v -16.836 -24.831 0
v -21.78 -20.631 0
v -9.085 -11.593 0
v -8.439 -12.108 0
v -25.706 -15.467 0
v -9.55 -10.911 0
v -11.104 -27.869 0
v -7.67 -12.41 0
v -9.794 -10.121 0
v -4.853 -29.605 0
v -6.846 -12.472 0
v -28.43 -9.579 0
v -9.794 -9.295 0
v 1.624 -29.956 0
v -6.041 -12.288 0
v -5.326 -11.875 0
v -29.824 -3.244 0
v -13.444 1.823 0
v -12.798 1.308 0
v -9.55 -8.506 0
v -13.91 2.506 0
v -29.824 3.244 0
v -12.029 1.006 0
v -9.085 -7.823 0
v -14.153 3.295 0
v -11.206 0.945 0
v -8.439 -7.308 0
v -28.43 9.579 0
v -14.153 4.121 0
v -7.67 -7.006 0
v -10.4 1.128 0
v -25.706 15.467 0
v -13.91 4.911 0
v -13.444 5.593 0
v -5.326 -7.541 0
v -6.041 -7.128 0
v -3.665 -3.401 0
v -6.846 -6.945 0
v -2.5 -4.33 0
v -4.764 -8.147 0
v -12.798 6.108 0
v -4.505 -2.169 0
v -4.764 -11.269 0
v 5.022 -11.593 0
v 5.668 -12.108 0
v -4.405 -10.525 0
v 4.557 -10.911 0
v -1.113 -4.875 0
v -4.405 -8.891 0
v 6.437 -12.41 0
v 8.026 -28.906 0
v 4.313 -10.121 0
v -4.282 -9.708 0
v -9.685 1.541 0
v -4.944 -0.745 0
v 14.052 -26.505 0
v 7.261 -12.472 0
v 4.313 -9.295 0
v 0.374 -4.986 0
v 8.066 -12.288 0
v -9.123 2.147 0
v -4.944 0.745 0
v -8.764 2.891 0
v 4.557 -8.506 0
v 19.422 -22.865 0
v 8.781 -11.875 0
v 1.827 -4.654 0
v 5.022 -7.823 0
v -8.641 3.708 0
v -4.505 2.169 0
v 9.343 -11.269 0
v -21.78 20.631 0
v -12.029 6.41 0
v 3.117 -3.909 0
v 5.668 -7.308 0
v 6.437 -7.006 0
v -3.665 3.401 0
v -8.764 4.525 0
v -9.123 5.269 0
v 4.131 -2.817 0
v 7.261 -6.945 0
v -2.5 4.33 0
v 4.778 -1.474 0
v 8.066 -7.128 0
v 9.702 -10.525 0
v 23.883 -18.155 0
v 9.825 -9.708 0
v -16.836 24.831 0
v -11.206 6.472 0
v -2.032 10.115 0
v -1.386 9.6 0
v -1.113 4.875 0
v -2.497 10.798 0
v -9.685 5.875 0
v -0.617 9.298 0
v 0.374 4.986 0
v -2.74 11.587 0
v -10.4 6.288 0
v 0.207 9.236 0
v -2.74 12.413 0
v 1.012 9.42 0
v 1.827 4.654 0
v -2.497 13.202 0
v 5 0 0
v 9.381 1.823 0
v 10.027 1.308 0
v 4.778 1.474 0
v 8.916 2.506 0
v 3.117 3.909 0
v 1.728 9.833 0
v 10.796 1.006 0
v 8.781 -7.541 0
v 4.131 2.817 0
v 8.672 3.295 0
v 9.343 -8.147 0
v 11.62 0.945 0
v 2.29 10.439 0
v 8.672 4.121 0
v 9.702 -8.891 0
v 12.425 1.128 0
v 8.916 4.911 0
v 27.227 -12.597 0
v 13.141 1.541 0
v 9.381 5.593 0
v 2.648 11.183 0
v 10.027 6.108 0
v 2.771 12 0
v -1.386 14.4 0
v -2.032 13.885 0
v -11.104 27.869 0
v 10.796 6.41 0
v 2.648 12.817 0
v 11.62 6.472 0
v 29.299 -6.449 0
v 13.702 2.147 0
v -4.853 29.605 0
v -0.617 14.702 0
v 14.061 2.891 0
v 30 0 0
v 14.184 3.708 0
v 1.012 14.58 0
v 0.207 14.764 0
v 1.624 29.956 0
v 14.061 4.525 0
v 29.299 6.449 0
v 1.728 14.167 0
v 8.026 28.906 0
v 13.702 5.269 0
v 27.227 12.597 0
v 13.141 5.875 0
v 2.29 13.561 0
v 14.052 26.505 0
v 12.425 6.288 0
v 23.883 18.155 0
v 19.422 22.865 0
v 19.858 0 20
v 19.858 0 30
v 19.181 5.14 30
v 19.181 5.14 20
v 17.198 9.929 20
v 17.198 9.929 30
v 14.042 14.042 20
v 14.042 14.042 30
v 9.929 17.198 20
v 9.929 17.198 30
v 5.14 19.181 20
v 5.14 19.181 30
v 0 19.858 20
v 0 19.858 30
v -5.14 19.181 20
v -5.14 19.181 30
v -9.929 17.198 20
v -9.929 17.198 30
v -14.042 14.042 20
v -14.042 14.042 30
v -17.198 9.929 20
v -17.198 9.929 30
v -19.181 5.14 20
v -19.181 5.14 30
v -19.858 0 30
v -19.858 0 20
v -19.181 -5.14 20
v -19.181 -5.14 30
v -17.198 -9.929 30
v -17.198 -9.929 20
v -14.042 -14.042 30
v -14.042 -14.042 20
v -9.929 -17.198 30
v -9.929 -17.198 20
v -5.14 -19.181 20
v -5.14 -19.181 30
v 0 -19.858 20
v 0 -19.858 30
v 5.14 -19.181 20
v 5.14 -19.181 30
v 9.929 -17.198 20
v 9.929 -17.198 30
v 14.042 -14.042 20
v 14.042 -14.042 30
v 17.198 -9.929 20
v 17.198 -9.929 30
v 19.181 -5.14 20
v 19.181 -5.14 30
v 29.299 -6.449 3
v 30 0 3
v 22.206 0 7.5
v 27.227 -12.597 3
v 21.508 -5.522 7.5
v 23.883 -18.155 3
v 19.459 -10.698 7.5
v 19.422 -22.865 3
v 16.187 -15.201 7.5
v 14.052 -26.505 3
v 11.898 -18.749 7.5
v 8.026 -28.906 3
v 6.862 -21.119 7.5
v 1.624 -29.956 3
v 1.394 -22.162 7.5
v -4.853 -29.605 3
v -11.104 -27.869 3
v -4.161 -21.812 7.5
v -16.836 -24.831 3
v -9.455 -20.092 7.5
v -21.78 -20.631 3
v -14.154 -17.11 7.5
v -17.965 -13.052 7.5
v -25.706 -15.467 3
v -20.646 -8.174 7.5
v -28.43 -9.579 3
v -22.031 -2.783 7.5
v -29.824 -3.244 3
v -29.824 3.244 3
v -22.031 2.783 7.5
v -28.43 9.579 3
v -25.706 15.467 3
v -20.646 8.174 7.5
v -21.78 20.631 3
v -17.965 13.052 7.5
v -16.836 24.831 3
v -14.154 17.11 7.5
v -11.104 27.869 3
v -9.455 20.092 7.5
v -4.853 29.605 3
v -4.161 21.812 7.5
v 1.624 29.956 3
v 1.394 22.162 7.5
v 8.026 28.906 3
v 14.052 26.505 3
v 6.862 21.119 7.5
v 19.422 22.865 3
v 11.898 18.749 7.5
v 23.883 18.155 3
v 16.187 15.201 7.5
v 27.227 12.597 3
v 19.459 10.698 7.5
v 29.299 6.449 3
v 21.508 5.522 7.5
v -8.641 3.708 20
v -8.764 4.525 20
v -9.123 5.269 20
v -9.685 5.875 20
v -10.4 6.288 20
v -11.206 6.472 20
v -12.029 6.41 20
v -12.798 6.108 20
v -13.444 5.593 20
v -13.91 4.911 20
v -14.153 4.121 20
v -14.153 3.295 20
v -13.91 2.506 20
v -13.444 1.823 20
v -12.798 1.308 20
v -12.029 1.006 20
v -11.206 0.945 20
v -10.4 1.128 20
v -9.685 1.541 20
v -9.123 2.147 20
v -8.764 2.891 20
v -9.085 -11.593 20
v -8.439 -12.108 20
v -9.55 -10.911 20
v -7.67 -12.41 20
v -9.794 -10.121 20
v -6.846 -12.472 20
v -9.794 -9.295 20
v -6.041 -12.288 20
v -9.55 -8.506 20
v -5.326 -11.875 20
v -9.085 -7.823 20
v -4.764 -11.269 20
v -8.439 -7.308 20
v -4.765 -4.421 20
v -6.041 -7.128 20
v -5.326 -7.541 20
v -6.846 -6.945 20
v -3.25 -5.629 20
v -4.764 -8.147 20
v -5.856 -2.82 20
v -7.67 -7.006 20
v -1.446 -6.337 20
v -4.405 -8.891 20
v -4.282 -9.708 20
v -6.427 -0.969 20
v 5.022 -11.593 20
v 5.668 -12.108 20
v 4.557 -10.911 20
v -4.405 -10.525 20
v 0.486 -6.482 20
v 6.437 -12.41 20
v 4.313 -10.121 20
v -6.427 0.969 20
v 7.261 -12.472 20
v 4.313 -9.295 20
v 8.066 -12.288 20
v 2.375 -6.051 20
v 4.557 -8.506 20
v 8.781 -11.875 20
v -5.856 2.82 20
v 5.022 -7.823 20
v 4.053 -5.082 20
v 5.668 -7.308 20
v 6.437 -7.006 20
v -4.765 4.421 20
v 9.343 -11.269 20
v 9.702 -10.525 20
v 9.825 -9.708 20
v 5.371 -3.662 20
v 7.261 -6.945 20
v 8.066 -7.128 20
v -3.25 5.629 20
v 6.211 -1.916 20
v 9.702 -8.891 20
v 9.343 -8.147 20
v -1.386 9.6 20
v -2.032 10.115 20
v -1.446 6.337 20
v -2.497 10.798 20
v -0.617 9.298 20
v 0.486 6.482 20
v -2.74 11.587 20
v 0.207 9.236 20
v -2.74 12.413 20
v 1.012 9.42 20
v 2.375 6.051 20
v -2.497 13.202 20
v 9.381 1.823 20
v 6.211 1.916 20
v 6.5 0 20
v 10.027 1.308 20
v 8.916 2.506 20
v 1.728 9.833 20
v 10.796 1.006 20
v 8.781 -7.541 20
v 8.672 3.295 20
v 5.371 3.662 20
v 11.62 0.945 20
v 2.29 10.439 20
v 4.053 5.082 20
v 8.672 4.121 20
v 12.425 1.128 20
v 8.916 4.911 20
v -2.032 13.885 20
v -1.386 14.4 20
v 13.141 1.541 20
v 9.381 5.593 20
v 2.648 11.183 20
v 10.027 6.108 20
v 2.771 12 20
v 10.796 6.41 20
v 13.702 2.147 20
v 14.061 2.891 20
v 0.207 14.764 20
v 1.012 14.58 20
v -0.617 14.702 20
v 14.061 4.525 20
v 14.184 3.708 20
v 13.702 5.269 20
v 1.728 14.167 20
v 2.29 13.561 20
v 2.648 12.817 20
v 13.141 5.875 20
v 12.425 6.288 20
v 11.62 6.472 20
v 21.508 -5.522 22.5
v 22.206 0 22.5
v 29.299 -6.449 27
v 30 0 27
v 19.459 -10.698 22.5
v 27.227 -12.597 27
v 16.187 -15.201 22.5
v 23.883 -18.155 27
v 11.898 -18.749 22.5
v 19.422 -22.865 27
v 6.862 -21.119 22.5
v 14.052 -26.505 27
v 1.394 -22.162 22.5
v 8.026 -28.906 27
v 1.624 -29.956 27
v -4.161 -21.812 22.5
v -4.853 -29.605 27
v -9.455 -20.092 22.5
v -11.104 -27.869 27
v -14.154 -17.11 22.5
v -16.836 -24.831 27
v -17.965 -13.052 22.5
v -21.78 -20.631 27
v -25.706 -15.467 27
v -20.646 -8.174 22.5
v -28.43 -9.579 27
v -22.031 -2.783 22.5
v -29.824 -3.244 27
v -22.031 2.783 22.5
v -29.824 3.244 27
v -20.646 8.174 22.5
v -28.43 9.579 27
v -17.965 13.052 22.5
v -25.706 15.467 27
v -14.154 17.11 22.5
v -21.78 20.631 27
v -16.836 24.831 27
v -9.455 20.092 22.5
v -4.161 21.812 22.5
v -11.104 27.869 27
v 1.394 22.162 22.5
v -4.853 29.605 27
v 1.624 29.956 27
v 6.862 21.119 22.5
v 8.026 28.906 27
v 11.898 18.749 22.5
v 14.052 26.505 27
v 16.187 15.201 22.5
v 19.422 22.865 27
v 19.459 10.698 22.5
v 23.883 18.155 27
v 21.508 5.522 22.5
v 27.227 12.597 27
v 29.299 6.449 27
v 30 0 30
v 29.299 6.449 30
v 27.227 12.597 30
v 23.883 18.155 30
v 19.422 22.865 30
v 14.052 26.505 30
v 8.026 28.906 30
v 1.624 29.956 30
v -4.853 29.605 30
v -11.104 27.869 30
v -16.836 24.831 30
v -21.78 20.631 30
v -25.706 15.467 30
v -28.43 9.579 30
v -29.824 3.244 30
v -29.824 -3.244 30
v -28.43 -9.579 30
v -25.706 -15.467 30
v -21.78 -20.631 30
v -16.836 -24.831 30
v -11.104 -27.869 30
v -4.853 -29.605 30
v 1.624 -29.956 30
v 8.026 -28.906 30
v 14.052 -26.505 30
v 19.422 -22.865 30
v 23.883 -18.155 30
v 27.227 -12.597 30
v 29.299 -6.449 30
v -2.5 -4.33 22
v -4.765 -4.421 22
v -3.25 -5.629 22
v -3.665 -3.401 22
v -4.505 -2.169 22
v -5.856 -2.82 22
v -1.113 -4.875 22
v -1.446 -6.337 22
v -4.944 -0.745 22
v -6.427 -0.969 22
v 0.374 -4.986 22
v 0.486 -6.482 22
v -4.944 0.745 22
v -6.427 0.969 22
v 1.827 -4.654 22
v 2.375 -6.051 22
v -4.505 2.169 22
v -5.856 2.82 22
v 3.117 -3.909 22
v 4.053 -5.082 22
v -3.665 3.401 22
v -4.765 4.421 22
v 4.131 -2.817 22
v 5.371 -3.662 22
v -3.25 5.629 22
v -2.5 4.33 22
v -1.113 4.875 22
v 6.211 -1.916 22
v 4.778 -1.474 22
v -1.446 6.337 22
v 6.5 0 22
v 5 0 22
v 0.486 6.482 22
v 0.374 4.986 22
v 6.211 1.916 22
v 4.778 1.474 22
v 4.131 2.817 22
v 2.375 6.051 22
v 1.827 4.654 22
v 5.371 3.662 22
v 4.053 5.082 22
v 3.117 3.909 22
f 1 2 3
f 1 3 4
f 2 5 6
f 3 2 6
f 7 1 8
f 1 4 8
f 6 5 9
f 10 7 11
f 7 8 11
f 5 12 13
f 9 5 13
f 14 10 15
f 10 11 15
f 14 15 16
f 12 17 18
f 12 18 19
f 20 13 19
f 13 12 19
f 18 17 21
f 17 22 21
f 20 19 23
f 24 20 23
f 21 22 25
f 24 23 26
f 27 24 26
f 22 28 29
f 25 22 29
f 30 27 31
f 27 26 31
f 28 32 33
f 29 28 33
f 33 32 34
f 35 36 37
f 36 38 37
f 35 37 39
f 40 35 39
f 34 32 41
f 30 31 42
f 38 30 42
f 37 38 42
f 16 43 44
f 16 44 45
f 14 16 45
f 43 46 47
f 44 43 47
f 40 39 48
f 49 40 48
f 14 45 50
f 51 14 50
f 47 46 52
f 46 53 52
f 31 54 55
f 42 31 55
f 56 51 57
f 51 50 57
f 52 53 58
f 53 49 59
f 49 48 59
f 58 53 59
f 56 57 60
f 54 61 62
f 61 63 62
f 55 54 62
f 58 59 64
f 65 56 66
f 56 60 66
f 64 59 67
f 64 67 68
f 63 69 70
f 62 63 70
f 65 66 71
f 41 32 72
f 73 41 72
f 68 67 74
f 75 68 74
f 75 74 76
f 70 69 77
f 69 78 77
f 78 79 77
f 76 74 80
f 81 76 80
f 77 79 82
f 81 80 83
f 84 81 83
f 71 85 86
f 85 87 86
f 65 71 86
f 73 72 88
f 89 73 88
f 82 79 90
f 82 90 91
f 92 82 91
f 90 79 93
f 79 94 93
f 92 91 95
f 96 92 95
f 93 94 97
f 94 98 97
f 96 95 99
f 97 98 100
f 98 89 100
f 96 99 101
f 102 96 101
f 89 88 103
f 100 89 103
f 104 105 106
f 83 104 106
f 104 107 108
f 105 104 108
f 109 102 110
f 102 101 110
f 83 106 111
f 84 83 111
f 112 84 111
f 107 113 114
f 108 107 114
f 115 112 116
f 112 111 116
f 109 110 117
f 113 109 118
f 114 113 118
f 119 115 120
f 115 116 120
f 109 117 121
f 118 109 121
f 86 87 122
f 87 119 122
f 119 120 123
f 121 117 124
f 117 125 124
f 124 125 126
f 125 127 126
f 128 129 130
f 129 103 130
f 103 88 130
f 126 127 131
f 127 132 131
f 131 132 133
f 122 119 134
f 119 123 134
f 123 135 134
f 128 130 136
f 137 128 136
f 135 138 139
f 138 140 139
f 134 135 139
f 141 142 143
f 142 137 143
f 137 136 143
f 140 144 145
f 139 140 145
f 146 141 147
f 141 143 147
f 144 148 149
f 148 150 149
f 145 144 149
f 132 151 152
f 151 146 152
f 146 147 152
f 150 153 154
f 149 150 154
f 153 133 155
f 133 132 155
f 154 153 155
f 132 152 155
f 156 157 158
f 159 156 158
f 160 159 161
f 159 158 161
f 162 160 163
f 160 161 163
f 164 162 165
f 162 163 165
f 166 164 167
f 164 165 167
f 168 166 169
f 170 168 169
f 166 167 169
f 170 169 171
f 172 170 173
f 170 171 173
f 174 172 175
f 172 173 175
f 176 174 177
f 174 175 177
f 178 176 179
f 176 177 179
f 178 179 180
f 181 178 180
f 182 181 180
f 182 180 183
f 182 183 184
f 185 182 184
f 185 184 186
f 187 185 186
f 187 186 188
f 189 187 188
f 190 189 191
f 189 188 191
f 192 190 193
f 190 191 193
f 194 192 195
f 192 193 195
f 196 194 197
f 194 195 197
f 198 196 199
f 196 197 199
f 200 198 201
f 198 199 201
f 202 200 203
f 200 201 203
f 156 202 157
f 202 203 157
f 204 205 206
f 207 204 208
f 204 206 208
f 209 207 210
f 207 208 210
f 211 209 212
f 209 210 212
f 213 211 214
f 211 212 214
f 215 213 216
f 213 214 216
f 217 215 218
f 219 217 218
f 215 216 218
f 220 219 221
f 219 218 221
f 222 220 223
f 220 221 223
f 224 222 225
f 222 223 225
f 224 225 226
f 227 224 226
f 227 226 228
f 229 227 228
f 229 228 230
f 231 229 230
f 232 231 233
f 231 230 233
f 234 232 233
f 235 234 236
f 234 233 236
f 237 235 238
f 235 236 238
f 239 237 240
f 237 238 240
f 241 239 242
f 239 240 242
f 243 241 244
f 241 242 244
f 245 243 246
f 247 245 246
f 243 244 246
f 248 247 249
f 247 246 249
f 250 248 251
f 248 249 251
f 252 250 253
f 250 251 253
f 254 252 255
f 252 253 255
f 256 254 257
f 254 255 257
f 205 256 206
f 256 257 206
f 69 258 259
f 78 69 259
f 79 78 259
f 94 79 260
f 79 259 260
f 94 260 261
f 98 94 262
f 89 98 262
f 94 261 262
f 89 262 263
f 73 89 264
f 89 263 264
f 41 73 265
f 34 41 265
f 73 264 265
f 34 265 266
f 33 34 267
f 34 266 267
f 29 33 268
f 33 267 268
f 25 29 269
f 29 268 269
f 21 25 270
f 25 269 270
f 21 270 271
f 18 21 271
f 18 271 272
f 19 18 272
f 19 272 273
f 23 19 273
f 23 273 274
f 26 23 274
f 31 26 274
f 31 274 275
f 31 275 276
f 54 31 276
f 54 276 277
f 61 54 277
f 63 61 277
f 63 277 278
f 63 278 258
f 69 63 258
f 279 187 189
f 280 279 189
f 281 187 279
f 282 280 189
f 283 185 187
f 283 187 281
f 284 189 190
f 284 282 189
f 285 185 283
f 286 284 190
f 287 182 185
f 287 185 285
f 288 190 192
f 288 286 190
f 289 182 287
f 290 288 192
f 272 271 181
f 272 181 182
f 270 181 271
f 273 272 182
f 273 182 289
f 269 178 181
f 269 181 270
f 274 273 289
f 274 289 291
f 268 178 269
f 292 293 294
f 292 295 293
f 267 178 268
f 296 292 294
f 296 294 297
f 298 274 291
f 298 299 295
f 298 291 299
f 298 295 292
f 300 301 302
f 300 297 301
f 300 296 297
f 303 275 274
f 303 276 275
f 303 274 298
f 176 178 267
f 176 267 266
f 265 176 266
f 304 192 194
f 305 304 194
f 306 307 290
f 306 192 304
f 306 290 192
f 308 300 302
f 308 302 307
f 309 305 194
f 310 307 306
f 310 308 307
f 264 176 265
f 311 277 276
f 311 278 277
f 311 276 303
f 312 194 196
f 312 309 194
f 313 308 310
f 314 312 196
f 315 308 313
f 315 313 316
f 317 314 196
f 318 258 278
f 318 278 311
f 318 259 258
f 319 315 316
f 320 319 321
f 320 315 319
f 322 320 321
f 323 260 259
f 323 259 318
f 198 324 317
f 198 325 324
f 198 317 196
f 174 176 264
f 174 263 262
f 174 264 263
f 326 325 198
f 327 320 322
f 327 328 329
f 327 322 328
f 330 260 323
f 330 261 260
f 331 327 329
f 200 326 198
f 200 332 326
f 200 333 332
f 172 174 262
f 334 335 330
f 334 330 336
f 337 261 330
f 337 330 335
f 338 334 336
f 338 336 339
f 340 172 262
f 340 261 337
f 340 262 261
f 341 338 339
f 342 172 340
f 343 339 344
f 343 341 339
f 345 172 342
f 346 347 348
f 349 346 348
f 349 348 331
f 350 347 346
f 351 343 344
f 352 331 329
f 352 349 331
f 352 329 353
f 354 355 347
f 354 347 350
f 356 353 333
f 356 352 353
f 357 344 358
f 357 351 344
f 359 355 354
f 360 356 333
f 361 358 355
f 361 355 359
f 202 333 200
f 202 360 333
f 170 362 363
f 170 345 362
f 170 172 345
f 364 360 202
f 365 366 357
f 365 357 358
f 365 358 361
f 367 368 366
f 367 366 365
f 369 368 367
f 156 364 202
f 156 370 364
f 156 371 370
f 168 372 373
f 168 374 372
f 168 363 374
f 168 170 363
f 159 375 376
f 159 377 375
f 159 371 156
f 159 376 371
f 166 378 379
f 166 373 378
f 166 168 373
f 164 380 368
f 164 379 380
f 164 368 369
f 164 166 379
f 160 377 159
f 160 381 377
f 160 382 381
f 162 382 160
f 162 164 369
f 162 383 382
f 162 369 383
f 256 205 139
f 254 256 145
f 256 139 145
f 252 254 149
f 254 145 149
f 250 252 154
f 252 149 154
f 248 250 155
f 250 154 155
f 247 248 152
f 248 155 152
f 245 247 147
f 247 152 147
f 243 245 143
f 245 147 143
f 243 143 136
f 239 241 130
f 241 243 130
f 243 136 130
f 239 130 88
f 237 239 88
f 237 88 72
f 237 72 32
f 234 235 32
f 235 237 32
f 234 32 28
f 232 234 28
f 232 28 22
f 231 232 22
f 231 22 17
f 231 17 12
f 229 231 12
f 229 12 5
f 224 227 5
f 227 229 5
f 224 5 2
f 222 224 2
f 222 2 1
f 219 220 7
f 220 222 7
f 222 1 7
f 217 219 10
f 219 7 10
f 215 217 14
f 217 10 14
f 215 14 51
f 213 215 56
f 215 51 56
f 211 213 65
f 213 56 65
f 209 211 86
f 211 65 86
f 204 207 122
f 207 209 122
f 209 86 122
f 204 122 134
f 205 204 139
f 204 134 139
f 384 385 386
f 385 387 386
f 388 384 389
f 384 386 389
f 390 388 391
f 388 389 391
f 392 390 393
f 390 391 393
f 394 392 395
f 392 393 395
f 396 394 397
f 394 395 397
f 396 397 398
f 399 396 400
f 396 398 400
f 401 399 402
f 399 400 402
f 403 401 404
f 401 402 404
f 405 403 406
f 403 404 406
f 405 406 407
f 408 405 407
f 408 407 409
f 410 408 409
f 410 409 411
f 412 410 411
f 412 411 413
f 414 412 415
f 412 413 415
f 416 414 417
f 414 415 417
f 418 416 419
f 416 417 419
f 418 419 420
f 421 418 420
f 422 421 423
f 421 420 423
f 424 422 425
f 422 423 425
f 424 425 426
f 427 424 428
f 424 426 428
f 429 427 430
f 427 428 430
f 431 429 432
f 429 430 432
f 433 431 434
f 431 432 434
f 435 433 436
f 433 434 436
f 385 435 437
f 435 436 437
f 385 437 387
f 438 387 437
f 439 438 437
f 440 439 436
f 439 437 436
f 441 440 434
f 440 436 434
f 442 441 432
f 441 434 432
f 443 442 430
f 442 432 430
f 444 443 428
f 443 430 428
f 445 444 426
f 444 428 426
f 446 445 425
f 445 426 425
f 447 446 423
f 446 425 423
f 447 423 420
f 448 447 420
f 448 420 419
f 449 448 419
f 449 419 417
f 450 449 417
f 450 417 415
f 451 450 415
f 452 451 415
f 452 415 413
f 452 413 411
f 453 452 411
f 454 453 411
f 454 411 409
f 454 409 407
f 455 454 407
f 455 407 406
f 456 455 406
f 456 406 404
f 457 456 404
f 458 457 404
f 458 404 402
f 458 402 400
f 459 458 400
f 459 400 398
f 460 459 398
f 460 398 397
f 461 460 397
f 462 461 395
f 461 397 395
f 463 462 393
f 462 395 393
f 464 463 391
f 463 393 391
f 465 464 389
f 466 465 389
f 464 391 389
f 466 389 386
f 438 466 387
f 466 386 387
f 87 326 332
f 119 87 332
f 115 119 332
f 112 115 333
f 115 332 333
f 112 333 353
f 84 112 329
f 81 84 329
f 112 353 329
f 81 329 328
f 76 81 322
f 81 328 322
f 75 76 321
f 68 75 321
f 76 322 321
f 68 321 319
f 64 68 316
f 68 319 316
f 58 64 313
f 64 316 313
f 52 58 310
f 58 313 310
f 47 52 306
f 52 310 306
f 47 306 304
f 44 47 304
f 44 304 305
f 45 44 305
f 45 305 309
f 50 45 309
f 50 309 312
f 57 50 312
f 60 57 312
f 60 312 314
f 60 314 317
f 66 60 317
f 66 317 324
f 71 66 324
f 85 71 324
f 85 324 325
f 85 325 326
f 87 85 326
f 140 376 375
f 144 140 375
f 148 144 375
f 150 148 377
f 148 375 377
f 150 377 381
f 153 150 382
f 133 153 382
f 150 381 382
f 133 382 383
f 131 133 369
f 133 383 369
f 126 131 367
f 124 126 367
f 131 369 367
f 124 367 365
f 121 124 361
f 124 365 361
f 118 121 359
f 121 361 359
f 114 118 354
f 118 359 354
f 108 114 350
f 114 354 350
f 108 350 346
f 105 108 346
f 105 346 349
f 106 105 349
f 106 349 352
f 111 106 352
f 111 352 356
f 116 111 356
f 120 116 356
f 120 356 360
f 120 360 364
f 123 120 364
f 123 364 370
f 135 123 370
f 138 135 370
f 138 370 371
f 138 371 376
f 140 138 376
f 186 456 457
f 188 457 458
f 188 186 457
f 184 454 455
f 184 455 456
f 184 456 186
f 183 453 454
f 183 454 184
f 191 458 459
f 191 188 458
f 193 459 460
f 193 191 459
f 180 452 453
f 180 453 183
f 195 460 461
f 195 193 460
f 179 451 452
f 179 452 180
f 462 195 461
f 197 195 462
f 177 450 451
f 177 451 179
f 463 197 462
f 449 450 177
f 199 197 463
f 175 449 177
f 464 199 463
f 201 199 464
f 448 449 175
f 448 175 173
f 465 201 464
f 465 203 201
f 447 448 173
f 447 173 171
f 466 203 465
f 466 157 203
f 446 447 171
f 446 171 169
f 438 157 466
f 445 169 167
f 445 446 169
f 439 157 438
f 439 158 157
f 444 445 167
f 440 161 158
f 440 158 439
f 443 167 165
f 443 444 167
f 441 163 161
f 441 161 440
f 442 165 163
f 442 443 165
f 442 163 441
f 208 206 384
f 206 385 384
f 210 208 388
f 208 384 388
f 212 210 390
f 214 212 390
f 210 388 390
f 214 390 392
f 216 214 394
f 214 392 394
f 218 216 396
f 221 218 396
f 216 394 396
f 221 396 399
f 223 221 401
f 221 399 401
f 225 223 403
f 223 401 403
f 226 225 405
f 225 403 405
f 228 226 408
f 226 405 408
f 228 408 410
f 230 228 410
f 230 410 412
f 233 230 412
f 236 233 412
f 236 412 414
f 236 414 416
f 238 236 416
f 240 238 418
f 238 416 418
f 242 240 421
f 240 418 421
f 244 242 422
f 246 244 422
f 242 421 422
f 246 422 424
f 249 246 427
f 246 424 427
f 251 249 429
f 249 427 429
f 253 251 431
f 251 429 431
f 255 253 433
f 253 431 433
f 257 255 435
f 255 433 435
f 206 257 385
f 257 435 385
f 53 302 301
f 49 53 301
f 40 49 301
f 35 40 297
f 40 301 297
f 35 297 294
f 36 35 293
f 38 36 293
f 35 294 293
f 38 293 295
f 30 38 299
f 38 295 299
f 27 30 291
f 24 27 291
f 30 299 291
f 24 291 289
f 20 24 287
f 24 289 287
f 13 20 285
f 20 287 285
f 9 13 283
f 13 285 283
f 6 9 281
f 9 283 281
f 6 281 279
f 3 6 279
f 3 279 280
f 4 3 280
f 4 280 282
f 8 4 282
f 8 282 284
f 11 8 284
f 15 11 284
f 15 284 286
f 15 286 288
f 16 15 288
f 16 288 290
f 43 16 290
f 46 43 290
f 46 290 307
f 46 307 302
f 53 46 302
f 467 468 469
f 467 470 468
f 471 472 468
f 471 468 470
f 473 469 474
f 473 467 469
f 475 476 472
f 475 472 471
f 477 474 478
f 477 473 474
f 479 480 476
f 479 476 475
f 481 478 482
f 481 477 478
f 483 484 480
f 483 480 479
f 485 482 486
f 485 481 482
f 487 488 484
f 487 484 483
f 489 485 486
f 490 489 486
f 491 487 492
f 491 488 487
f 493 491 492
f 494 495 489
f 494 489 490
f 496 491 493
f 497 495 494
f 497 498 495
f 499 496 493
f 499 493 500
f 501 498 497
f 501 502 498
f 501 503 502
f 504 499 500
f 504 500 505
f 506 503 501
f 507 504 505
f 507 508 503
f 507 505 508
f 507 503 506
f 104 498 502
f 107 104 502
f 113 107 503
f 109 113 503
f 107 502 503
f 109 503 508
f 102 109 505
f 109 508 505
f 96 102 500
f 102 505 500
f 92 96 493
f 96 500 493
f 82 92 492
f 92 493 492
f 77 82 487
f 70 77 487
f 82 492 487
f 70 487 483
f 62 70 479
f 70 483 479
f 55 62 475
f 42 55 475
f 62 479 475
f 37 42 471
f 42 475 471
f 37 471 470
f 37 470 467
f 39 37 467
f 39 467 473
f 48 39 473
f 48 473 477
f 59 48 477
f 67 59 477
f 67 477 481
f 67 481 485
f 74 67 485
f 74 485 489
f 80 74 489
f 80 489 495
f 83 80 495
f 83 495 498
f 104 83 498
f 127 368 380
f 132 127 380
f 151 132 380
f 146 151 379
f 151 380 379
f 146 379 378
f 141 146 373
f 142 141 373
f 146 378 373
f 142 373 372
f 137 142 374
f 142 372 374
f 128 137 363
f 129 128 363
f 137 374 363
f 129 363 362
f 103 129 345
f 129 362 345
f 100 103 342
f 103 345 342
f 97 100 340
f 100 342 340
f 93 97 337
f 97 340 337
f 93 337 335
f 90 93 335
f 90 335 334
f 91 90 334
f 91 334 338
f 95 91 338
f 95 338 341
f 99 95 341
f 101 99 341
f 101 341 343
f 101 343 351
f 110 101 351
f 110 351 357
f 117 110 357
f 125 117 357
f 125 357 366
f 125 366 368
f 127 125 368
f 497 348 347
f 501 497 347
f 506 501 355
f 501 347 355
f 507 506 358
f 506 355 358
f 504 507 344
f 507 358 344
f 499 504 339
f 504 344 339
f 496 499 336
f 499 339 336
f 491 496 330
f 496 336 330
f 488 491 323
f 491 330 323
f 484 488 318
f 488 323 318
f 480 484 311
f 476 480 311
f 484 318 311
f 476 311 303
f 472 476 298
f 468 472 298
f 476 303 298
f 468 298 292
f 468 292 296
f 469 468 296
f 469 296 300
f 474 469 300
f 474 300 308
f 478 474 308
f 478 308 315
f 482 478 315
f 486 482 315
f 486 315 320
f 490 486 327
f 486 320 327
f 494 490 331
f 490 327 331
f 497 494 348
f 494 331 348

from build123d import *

# Parameters (mm, degrees)
SKETCH1_R                = 30
SKETCH1_R_2              = 5
BOSS_EXTRUDE3_DEPTH      = 30
SKETCH2_R                = 19.858143103
CUT_EXTRUDE1_DEPTH       = 10
SKETCH3_R                = 2.771368275
CUT_EXTRUDE2_DEPTH       = 21
SKETCH4_R                = 6.5
SKETCH4_R_2              = 5
BOSS_EXTRUDE4_DEPTH      = 2
BOSS_EXTRUDE4_DEPTH_BACK = 7


with BuildPart() as part:
    # Sketch1 → Boss-Extrude3 (new body)
    with BuildSketch(Plane.XY):
        Circle(SKETCH1_R)
        Circle(SKETCH1_R_2, mode=Mode.SUBTRACT)
    extrude(amount=BOSS_EXTRUDE3_DEPTH)

    # Sketch2 → Cut-Extrude1 (cut)
    with BuildSketch(Plane.XY.offset(30)):
        Circle(SKETCH2_R)
    cut_extrude1 = extrude(amount=-CUT_EXTRUDE1_DEPTH, mode=Mode.SUBTRACT)

    # Mirror1: Cut-Extrude1 across plane
    add(cut_extrude1.mirror(Plane.XY), mode=Mode.SUBTRACT)

    # Sketch3 → Cut-Extrude2 (cut, through all)
    with BuildSketch(Plane.XY.offset(20)):
        with Locations((0, 12)):
            Circle(SKETCH3_R)
        with Locations((11.412678196, 3.708203932)):
            Circle(SKETCH3_R)
        with Locations((7.053423028, -9.708203932)):
            Circle(SKETCH3_R)
        with Locations((-7.053423028, -9.708203932)):
            Circle(SKETCH3_R)
        with Locations((-11.412678196, 3.708203932)):
            Circle(SKETCH3_R)
    extrude(amount=-CUT_EXTRUDE2_DEPTH, mode=Mode.SUBTRACT)

    # Sketch4 → Boss-Extrude4 (add, two sides)
    with BuildSketch(Plane.XY.offset(20)) as boss_extrude4_sk:
        Circle(SKETCH4_R)
        Circle(SKETCH4_R_2, mode=Mode.SUBTRACT)
    extrude(amount=BOSS_EXTRUDE4_DEPTH)
    extrude(boss_extrude4_sk.sketch, amount=-BOSS_EXTRUDE4_DEPTH_BACK)

    # Sketch5 → Cut-Revolve1 (revolve, cut)
    with BuildSketch(Plane(origin=(0, 0, 0), x_dir=(1, 0, 0), z_dir=(0, 1, 0))):
        Polygon((30, -3), (22.205771366, -7.5), (22.205771366, -22.5), (30, -27), align=None)
    revolve(axis=Axis((0, 0, 0), (0, 0, -1)), mode=Mode.SUBTRACT)


solid = part.part
